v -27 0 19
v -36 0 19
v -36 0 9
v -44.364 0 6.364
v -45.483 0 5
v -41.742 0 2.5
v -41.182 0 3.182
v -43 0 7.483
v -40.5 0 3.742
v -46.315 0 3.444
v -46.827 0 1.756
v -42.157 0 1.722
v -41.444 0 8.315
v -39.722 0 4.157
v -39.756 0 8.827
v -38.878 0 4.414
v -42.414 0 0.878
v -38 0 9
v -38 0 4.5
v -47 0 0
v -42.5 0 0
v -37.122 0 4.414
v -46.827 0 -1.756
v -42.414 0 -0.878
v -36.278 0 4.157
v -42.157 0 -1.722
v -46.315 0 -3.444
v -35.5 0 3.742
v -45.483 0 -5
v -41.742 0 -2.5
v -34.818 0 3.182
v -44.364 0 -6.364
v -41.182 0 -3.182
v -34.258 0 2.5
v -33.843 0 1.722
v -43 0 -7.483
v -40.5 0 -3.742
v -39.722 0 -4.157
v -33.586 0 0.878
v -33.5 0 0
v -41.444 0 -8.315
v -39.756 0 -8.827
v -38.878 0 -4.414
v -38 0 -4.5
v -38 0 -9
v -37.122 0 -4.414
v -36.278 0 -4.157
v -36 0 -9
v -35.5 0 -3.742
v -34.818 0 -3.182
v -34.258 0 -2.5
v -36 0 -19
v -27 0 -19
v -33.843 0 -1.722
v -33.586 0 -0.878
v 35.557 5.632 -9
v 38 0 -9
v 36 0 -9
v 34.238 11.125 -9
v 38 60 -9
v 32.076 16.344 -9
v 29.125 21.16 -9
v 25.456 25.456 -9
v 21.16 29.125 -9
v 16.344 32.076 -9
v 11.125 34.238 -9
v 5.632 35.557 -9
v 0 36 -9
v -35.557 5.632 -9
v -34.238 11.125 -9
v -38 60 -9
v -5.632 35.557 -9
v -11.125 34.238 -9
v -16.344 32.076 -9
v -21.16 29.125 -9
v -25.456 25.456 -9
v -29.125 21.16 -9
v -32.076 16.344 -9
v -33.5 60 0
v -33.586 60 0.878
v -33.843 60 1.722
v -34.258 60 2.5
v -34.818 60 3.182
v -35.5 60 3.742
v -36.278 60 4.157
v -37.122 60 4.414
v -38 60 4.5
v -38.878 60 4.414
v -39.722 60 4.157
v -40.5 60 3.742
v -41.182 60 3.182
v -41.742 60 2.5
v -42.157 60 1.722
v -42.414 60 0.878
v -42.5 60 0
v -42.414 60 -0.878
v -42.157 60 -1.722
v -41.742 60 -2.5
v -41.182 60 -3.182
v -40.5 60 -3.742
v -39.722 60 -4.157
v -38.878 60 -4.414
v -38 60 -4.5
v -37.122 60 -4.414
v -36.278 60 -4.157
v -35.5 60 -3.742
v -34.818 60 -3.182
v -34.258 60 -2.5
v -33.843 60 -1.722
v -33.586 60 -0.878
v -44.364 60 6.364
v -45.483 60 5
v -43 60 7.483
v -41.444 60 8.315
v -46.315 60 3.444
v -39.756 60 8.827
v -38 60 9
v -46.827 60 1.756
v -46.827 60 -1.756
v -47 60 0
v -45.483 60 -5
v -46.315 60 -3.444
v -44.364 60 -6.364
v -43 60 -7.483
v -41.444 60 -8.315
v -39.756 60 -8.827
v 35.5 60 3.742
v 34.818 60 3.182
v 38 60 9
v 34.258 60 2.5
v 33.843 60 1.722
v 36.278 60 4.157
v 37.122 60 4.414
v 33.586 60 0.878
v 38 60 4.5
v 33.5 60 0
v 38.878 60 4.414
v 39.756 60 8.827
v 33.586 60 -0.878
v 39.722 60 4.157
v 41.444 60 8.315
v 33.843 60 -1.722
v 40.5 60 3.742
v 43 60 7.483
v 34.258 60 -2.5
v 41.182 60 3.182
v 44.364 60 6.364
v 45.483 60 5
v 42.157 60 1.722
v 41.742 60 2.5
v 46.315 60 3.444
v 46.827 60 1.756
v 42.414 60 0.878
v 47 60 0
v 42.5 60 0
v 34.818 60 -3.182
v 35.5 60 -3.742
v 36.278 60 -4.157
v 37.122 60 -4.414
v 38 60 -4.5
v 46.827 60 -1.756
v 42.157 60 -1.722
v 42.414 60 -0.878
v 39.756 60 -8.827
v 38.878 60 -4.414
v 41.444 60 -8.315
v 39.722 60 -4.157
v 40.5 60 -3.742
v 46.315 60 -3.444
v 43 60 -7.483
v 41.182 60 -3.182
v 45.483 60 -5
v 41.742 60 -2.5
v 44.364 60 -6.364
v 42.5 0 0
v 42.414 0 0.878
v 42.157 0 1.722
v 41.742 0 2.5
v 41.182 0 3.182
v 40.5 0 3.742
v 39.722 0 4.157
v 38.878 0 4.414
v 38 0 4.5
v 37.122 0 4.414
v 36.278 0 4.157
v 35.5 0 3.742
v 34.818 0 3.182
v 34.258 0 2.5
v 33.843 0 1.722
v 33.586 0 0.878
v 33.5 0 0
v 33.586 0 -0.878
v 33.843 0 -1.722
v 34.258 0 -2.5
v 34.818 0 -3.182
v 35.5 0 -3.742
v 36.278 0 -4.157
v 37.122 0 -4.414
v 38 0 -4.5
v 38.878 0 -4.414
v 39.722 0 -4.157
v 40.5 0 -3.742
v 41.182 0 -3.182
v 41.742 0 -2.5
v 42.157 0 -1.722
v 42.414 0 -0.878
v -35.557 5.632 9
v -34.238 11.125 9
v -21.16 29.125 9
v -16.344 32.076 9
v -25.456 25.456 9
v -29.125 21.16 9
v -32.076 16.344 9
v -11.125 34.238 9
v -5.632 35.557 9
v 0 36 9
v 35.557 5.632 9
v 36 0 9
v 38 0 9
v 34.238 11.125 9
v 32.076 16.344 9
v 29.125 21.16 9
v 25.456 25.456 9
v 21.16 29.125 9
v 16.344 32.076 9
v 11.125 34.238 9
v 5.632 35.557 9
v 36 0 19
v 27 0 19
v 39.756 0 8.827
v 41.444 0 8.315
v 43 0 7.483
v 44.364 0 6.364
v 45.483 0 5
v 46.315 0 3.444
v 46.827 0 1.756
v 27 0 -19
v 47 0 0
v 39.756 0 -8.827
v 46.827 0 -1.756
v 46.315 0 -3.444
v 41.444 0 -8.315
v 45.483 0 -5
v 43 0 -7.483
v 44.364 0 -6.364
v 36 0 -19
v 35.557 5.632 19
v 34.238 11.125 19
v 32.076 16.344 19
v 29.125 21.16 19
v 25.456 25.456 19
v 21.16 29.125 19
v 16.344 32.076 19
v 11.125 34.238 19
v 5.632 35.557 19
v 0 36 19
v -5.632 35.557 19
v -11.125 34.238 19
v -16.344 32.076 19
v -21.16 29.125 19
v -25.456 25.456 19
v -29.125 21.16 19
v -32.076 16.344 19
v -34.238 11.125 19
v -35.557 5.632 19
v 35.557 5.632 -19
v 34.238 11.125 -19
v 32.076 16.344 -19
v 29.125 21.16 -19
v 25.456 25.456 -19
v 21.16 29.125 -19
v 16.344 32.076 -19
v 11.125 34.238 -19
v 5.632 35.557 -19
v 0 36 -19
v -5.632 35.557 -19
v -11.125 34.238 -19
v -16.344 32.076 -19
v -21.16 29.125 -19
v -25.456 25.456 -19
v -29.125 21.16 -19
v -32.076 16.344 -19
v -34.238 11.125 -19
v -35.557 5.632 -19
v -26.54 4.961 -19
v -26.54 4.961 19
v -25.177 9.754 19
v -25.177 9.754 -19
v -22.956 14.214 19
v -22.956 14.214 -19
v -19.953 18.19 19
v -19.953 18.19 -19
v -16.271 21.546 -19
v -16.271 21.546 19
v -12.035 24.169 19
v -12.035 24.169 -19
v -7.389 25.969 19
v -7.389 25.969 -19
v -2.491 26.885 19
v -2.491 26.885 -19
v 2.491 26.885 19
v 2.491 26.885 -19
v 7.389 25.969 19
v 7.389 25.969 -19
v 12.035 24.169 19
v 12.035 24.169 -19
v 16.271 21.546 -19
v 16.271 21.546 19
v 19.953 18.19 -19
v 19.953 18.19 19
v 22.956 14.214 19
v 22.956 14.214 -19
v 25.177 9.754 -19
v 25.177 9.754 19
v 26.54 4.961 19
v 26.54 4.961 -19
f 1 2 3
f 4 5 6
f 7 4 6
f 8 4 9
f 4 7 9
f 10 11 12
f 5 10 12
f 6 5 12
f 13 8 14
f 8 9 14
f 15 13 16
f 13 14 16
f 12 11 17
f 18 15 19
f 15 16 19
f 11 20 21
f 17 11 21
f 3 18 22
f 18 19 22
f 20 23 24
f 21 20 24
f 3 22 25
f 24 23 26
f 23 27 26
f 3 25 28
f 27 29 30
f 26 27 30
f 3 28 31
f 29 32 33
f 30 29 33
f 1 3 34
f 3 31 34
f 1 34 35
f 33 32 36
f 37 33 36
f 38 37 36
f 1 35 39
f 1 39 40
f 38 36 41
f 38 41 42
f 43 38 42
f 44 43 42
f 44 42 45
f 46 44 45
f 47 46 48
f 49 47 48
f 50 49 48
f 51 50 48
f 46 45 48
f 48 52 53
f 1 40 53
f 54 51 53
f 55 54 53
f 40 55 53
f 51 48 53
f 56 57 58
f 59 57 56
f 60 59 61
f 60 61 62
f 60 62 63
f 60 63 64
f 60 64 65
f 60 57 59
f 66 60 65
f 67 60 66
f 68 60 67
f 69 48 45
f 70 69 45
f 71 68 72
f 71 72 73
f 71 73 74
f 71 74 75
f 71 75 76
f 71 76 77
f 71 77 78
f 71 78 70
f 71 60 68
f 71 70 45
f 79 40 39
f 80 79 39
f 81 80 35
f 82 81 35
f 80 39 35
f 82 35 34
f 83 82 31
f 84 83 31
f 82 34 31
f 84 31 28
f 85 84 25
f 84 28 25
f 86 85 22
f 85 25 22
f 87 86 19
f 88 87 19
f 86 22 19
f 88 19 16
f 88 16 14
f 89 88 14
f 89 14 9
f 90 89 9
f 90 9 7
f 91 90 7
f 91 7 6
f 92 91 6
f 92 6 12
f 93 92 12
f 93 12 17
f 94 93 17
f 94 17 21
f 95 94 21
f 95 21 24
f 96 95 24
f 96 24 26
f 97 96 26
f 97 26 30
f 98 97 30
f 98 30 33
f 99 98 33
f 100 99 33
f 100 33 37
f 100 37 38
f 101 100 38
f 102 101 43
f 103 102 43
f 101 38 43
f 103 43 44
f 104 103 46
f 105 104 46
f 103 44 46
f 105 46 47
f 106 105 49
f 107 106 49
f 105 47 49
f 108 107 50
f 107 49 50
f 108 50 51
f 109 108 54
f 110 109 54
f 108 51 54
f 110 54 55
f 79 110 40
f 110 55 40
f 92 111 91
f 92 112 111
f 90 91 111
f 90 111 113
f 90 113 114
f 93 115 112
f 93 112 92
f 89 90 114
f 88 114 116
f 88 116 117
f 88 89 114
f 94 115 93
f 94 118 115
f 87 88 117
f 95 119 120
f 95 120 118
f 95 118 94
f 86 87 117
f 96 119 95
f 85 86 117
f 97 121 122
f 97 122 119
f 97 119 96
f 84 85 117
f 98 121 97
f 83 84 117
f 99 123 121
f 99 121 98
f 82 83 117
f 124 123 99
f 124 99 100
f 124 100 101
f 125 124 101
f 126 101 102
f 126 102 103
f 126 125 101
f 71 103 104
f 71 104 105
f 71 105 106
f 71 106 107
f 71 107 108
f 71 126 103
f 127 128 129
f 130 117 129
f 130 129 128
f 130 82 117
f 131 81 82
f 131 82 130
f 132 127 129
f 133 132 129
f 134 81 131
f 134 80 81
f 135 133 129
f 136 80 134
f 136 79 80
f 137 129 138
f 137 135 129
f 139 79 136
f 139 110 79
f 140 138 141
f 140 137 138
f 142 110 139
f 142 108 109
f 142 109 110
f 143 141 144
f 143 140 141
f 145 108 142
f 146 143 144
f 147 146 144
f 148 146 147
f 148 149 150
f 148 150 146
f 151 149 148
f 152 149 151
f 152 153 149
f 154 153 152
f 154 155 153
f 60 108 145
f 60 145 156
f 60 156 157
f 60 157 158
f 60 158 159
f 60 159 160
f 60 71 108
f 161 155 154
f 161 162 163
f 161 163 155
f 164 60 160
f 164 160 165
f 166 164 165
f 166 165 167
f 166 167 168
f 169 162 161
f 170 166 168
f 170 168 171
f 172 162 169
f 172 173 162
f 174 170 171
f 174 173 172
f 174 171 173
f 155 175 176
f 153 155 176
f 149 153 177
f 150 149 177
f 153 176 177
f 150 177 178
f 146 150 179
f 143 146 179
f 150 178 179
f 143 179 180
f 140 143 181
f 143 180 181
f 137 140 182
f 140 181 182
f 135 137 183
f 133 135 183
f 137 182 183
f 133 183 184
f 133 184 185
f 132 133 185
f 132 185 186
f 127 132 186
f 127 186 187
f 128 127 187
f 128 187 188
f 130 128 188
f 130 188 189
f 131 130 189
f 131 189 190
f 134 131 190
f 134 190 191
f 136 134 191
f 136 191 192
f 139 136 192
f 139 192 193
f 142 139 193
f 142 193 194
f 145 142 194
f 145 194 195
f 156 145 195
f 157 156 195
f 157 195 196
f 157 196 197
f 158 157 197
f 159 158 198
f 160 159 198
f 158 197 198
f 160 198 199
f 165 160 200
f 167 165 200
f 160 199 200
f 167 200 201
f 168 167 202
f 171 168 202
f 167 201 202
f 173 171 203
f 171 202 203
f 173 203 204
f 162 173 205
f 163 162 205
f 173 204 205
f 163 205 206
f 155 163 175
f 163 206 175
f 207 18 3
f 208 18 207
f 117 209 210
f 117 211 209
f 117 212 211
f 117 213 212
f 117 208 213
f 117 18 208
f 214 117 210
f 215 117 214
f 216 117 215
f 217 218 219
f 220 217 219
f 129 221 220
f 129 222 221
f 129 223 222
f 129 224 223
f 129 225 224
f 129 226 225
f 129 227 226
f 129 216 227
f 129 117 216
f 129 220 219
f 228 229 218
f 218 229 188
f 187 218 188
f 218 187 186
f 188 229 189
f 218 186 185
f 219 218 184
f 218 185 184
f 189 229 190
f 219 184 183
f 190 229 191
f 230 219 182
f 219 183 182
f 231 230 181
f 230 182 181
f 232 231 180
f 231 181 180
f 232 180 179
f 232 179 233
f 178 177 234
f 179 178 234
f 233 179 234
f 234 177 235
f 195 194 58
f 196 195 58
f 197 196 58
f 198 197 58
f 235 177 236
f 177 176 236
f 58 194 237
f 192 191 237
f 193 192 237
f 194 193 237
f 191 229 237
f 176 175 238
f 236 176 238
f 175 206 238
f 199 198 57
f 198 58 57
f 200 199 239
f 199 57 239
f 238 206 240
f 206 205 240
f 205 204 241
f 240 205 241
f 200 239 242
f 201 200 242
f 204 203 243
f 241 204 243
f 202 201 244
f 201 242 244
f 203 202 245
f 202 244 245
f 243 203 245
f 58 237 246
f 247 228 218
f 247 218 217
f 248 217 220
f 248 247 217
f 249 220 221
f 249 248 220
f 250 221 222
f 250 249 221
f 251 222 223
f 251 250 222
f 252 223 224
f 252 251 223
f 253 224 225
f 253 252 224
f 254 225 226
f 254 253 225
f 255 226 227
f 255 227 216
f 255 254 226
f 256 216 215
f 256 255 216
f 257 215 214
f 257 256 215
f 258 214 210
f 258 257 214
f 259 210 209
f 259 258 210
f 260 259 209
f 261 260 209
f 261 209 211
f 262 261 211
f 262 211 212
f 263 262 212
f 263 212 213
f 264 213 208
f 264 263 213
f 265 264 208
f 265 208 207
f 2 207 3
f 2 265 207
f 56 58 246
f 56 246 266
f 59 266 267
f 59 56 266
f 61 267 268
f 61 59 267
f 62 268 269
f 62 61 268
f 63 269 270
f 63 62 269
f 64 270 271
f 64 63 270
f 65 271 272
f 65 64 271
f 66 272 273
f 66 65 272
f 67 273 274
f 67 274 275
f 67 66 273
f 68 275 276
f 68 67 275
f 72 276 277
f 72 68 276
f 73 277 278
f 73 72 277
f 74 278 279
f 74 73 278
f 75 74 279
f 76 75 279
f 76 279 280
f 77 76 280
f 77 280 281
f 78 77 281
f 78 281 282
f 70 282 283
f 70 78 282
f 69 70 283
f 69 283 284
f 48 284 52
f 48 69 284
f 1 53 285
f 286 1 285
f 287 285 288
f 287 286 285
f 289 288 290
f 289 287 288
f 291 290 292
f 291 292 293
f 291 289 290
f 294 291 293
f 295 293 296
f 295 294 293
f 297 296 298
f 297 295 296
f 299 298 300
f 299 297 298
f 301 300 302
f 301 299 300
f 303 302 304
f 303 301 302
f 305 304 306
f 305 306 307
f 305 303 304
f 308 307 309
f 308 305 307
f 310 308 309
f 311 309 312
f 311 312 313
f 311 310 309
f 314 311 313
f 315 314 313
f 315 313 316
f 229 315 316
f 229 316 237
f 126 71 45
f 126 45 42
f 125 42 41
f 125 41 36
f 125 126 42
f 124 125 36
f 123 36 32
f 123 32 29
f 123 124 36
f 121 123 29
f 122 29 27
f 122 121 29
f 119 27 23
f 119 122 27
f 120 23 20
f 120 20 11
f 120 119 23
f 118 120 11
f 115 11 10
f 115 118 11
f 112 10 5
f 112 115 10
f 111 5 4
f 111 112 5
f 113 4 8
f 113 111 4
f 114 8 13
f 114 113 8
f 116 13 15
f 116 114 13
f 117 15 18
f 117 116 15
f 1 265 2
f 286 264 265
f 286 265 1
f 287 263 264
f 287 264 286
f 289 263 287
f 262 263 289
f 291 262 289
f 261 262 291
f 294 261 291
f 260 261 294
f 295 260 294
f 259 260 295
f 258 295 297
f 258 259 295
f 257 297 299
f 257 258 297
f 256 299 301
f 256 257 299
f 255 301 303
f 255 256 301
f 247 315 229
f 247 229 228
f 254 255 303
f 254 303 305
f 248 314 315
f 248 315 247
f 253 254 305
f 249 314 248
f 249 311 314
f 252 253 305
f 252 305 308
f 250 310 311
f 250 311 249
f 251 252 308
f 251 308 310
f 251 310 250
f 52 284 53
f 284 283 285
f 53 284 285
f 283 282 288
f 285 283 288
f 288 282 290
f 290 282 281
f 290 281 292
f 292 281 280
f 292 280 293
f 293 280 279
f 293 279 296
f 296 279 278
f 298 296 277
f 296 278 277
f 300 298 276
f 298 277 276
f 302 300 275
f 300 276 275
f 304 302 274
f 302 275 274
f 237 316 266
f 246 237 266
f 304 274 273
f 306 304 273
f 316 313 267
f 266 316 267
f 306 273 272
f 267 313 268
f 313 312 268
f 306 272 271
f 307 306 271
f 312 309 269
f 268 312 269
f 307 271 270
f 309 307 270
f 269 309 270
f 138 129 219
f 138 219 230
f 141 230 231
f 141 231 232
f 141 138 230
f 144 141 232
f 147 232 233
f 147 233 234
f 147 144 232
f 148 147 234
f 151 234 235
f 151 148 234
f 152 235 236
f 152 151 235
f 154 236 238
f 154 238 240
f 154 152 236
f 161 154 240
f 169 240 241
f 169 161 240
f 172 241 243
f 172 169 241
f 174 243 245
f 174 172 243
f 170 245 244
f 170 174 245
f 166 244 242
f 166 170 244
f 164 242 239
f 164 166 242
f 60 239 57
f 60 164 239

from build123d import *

# Parameters (mm, degrees)
BOSS_EXTRUDE1_DEPTH = 19
BOSS_EXTRUDE2_DEPTH = 60
CUT_EXTRUDE1_DEPTH  = 29
SKETCH4_R           = 4.5
CUT_EXTRUDE2_DEPTH  = 61


with BuildPart() as part:
    # Sketch1 → Boss-Extrude1 (new body, symmetric)
    with BuildSketch(Plane.XY):
        with BuildLine():
            Line((-36, 0), (-27, 0))
            ThreePointArc((-27, 0), (0, 27), (27, 0))
            Line((27, 0), (36, 0))
            ThreePointArc((36, 0), (0, 36), (-36, 0))
        make_face()
    extrude(amount=BOSS_EXTRUDE1_DEPTH, both=True)

    # Sketch2 → Boss-Extrude2 (add)
    with BuildSketch(Plane(origin=(0, 60, 0), x_dir=(-1, 0, 0), z_dir=(0, -1, 0))):
        with BuildLine():
            Line((-38, 9), (38, 9))
            ThreePointArc((38, 9), (47, 0), (38, -9))
            Line((38, -9), (-38, -9))
            ThreePointArc((-38, -9), (-47, 0), (-38, 9))
        make_face()
    extrude(amount=BOSS_EXTRUDE2_DEPTH)

    # Sketch3 → Cut-Extrude1 (cut, through all)
    with BuildSketch(Plane.XY.offset(9)):
        with BuildLine():
            Line((-27, 0), (27, 0))
            ThreePointArc((27, 0), (0, 27), (-27, 0))
        make_face()
    extrude(amount=-CUT_EXTRUDE1_DEPTH, mode=Mode.SUBTRACT)

    # Sketch4 → Cut-Extrude2 (cut, through all)
    with BuildSketch(Plane.XZ):
        with Locations((-38, 0)):
            Circle(SKETCH4_R)
        with Locations((38, 0)):
            Circle(SKETCH4_R)
    extrude(amount=-CUT_EXTRUDE2_DEPTH, mode=Mode.SUBTRACT)


solid = part.part
